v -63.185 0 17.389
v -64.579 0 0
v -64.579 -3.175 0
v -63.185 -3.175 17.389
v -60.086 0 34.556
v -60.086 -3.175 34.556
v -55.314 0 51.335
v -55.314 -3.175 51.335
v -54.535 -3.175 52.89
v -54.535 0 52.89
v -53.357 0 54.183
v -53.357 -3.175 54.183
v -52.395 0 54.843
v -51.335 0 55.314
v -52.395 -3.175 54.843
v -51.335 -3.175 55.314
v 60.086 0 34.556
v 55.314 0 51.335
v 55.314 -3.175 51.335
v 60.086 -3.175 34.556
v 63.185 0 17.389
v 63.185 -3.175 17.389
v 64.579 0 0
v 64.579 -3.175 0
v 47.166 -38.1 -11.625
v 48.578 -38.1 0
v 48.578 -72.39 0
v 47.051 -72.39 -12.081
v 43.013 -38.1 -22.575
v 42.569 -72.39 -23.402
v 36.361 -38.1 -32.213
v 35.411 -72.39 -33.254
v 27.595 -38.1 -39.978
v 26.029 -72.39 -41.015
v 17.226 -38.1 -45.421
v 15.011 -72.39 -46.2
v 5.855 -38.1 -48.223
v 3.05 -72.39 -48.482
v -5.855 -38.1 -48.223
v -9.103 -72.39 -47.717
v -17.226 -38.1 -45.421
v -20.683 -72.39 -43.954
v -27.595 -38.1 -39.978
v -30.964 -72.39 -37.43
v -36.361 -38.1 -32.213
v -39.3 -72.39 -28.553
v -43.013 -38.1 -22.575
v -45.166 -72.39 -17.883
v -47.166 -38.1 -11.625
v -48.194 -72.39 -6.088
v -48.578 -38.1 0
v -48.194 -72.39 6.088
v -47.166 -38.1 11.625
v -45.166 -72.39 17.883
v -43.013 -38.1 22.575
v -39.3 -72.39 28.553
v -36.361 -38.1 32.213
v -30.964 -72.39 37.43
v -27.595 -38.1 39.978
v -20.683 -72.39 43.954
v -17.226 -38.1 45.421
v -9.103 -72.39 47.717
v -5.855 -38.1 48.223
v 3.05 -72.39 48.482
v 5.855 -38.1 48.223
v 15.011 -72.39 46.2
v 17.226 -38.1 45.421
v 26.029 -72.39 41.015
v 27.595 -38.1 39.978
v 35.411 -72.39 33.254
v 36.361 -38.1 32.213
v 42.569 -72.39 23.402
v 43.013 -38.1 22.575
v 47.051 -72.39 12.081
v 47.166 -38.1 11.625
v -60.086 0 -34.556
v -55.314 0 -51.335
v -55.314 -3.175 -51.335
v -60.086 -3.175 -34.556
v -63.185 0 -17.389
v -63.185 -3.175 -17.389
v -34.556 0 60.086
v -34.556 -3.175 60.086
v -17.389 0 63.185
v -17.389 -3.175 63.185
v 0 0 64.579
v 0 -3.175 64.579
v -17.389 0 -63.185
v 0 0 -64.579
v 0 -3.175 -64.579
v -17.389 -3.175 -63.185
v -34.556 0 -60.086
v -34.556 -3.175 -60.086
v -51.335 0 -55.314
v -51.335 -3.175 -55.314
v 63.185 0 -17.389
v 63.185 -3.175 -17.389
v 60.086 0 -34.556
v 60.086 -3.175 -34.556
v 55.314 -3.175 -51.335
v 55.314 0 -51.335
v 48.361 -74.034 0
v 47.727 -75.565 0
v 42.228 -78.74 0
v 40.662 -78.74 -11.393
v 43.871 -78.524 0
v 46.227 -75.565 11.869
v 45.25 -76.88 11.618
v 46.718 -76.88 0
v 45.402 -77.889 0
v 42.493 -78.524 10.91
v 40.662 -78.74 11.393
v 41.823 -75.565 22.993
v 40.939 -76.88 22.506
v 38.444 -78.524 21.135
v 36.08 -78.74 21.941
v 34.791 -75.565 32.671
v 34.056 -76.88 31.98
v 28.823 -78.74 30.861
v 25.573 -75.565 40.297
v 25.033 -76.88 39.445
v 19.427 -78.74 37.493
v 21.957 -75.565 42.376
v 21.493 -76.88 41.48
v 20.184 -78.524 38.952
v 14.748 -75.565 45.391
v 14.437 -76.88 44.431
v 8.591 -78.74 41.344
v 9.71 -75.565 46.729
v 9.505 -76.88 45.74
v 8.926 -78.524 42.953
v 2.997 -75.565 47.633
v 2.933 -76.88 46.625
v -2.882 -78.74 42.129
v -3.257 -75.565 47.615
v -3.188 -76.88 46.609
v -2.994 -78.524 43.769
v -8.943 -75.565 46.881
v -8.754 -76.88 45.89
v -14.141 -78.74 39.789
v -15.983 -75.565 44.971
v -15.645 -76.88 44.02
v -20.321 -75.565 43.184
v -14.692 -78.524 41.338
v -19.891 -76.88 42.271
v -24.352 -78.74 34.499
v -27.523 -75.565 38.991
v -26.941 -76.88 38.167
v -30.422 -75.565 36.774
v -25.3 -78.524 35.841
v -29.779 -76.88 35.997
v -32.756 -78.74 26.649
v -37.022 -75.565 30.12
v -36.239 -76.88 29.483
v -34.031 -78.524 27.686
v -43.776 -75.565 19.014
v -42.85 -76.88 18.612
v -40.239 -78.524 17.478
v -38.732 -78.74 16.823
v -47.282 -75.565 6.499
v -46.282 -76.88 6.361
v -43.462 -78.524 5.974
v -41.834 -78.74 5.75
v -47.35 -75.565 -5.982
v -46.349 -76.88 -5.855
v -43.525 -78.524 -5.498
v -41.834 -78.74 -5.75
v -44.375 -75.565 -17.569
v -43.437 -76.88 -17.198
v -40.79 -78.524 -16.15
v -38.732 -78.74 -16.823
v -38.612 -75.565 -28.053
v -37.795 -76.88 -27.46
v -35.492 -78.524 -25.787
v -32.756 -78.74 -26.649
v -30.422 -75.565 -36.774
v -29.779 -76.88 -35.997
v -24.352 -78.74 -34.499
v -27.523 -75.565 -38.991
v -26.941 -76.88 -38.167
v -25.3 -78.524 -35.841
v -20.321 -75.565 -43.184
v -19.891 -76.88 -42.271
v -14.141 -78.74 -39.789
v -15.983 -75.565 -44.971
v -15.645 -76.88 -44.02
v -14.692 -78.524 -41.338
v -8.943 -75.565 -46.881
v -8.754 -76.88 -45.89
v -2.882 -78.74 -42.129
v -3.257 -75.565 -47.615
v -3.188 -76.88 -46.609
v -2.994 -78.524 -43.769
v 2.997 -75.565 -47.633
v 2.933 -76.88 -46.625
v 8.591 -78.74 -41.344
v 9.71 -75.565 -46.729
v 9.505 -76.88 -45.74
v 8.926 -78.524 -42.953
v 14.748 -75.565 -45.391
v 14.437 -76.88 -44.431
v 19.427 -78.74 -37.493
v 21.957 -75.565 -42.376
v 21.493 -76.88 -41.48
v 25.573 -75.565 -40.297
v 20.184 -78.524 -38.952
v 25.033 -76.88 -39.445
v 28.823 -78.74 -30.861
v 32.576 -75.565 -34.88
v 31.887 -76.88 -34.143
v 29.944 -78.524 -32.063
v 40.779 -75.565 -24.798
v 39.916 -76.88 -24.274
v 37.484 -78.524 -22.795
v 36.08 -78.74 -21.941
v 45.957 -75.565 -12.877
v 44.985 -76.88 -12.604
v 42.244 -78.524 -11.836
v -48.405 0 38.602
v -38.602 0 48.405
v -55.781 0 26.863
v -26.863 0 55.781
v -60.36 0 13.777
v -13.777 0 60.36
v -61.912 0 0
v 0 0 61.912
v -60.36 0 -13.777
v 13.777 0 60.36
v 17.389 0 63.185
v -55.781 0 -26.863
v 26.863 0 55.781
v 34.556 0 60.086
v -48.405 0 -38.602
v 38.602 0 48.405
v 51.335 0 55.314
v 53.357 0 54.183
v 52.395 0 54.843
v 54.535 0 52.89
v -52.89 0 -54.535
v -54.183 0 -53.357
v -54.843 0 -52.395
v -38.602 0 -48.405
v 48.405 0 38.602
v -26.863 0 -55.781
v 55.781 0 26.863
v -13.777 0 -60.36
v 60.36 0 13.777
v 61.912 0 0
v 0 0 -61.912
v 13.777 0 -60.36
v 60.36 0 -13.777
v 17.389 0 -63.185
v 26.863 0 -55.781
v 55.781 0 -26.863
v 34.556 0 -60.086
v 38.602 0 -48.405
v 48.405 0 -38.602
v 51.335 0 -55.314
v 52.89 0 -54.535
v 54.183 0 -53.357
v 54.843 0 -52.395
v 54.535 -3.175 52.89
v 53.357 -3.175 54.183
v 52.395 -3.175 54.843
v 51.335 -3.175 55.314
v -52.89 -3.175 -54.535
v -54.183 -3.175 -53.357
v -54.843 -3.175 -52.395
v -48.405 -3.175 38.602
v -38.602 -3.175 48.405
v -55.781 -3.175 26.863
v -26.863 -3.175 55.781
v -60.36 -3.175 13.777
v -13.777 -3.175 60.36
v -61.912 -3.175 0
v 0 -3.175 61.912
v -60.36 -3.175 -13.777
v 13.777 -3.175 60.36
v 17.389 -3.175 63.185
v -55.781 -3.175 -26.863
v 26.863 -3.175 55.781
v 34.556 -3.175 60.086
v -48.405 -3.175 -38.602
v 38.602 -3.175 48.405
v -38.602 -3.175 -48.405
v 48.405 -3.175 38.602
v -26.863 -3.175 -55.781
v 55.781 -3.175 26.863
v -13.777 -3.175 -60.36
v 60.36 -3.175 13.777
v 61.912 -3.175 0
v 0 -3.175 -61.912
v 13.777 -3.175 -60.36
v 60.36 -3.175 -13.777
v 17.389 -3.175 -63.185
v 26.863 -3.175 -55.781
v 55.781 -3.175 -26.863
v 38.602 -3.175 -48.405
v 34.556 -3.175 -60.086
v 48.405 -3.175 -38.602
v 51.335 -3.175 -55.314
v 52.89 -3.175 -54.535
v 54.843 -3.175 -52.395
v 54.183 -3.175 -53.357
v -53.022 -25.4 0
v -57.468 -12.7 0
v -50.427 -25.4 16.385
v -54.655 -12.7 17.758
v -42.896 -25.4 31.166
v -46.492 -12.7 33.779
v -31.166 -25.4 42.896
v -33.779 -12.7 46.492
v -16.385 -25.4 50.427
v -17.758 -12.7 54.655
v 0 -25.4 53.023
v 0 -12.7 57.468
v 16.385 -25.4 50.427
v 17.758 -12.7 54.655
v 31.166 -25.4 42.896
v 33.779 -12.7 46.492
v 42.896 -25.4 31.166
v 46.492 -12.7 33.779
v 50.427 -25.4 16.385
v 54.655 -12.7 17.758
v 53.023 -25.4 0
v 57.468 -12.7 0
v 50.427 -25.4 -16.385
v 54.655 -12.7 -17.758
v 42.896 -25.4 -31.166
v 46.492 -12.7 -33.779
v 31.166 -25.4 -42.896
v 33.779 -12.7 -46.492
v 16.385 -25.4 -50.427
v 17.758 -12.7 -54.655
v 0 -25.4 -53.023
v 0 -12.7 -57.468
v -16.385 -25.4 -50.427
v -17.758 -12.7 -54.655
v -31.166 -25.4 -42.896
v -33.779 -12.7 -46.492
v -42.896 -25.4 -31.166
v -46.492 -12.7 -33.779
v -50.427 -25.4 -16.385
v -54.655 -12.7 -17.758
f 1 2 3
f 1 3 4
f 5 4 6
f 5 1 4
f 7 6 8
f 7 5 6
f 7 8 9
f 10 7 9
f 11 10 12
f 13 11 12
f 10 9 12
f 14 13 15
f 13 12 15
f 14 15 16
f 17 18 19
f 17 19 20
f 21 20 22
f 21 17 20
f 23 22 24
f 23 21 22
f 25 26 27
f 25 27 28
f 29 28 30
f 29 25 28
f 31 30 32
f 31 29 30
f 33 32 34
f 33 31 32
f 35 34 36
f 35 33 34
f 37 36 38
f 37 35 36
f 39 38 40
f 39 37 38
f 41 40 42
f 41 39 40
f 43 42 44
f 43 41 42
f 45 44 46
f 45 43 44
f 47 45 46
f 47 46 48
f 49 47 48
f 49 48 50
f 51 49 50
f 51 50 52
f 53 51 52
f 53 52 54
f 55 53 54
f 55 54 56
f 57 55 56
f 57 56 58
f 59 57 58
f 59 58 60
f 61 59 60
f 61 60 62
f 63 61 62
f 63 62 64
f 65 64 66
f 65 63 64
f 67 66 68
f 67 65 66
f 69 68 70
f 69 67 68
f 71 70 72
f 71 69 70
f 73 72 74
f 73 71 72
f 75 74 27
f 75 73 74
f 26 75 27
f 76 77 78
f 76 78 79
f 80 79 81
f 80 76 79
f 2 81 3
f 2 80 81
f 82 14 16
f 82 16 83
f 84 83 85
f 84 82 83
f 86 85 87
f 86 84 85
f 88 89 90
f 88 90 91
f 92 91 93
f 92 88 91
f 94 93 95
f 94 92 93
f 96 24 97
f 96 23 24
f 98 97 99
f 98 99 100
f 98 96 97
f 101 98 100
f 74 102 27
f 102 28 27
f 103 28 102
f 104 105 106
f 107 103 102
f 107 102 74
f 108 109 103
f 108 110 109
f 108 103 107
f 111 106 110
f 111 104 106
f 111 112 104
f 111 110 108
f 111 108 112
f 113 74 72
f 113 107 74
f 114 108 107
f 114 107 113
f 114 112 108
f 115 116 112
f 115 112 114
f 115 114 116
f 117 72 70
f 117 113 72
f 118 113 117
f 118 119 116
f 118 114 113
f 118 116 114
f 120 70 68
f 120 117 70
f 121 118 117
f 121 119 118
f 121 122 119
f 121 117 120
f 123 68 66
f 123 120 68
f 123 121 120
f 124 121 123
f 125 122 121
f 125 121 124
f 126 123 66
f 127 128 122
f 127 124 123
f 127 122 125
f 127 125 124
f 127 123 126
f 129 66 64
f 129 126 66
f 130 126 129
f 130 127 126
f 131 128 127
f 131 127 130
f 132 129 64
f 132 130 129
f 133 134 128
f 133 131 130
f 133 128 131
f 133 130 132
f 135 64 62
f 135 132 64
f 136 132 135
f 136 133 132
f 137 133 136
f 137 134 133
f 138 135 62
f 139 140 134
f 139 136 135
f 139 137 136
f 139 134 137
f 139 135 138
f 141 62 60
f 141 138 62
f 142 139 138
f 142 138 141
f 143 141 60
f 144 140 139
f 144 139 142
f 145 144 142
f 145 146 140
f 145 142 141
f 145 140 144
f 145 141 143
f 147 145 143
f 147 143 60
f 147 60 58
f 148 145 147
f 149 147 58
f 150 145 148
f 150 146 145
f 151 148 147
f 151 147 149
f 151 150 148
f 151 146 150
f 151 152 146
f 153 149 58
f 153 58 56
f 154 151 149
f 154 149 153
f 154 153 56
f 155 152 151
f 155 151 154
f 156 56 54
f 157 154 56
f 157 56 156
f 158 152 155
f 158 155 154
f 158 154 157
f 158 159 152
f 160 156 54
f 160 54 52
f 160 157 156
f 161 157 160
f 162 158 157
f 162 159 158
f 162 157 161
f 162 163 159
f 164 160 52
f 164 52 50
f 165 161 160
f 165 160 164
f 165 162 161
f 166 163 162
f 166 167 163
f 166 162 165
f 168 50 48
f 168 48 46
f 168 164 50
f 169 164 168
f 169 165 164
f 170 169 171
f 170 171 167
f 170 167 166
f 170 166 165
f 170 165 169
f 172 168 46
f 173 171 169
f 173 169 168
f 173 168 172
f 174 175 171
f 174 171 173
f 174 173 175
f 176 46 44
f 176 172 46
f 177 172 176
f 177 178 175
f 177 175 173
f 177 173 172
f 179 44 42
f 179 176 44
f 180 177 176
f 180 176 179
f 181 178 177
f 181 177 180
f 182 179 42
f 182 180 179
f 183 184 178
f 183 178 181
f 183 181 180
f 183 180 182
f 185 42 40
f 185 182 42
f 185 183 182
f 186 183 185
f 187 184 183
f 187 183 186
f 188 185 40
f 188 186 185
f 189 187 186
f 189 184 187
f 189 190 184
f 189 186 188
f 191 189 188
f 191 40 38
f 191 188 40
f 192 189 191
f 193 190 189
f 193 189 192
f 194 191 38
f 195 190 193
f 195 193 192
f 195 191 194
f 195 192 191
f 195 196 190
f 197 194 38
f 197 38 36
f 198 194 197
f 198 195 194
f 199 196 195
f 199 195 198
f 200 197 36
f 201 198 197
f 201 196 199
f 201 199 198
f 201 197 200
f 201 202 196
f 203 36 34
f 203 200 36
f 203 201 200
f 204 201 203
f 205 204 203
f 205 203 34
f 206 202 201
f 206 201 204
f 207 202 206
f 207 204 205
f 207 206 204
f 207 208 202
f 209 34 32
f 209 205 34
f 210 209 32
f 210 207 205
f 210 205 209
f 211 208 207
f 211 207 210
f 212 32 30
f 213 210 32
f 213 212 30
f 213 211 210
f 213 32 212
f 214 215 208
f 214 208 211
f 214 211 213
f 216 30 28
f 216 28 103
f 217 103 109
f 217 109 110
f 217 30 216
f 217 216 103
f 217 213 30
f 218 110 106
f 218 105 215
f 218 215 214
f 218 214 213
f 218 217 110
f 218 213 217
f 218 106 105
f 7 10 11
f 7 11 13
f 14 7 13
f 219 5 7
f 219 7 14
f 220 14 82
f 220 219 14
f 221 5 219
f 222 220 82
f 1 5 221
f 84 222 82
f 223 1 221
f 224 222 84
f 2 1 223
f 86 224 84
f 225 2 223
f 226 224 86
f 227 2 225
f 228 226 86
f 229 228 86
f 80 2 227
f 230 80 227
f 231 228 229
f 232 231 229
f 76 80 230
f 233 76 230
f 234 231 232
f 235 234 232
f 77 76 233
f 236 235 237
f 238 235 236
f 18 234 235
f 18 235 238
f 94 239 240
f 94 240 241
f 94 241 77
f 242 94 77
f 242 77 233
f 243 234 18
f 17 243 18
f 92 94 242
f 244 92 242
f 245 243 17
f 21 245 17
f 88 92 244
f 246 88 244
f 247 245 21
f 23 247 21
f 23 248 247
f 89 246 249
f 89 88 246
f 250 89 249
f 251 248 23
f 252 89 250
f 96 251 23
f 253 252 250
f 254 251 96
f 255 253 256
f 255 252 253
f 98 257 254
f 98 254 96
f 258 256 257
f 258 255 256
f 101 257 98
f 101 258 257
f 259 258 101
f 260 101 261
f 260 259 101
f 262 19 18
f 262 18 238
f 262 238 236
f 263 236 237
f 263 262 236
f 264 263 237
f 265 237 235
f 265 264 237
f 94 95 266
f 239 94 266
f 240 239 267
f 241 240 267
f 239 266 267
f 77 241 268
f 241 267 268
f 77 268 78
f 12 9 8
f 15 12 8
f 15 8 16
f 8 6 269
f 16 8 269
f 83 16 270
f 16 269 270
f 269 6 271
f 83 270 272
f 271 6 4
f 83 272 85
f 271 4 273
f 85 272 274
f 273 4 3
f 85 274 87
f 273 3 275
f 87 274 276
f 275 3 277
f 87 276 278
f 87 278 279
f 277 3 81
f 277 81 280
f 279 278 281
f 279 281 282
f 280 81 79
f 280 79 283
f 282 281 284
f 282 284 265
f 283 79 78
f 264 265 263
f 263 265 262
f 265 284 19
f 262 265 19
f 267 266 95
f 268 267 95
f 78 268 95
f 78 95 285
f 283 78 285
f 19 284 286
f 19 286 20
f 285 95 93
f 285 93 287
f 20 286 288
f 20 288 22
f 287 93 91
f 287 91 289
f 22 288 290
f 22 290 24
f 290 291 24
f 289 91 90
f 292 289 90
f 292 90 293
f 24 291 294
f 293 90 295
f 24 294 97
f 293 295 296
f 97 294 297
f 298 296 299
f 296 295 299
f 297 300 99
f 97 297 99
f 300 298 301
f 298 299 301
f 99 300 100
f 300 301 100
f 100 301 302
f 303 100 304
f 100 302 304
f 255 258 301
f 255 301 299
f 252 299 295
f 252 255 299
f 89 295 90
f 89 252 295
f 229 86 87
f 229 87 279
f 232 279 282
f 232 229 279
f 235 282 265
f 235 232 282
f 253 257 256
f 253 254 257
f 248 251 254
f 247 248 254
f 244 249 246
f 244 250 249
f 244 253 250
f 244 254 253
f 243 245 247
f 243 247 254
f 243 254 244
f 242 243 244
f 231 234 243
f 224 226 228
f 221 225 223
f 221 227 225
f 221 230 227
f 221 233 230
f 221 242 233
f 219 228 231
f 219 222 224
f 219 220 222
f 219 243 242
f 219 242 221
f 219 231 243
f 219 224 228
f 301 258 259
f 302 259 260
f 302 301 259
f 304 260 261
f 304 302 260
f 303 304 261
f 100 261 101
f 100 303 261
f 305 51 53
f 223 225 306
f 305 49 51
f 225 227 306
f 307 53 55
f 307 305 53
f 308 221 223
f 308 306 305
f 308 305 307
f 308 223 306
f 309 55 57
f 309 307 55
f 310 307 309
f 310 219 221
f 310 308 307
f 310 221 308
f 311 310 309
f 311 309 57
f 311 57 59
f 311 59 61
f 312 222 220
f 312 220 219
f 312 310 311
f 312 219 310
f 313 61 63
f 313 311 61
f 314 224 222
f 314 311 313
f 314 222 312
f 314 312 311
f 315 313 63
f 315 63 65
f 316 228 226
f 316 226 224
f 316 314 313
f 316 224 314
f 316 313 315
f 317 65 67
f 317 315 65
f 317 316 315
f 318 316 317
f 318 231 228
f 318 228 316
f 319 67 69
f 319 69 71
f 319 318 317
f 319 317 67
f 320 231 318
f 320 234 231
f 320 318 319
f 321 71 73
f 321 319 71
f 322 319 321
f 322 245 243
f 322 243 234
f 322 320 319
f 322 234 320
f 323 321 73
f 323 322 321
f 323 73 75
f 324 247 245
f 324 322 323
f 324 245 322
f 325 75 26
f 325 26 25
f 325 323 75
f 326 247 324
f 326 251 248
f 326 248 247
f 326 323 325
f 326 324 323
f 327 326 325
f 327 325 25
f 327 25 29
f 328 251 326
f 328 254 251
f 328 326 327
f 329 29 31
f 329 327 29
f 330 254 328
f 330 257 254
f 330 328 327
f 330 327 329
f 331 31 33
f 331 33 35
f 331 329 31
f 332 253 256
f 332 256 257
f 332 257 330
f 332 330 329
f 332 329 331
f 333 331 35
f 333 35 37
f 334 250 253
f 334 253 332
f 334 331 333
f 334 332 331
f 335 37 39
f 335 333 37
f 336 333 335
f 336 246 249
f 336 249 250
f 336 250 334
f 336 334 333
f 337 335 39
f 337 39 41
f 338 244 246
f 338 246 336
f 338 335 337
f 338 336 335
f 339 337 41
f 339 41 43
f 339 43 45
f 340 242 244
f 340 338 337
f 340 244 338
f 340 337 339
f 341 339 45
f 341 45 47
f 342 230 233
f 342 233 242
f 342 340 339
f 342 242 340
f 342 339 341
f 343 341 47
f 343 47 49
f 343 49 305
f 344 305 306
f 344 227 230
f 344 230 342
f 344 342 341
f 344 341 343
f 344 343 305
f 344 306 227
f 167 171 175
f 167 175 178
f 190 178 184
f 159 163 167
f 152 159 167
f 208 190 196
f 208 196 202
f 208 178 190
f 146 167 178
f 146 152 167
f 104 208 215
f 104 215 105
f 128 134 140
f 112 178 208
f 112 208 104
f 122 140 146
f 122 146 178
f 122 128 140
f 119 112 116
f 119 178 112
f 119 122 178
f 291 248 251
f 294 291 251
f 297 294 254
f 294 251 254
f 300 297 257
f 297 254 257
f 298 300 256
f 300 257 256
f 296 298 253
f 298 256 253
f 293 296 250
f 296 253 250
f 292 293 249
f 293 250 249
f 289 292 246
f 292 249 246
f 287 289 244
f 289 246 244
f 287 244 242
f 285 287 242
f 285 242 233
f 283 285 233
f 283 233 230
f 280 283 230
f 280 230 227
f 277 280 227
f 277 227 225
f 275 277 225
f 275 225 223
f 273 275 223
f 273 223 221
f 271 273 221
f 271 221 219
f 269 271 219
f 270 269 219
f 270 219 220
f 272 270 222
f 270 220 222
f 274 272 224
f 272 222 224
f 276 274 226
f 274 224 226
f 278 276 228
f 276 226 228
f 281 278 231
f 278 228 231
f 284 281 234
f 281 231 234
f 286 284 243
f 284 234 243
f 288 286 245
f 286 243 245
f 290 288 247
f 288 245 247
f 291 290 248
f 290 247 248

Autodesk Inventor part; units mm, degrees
ref_plane "YZ Plane" through (0, 0, 0) normal (1, 0, 0) x (0, 1, 0)
ref_plane "XY Plane" through (0, 0, 0) normal (0, 0, 1) x (1, 0, 0)
sketch "Sketch1" plane through (0, 0, 0) normal (0, 1, 0) x (-1, 0, 0)
  circle A0 centre (0, 0) radius 61.9125
  dimension "d0" = 123.825
ref_plane "Work Plane1" through (0, -38.1, 0) normal (0, 1, 0) x (-1, 0, 0)
sketch "Sketch2" plane through (0, -38.1, 0) normal (0, 1, 0) x (-1, 0, 0)
  circle A0 centre (0, 0) radius 48.5775
  dimension "d2" = 97.155
loft "Loft1" add profiles "Sketch1", "Sketch2"
sketch "Sketch3" plane through (0, -38.1, 0) normal (0, -1, 0) x (1, 0, 0)
  circle A0 centre (0, 0) radius 48.5775 projected
extrude "Extrusion1" add sketch "Sketch3" along normal blind 40.64
fillet "Fillet1" radius 6.35 1 edges at (-48.5775, -78.74, 0)
sketch "Sketch4" plane through (0, 0, 0) normal (0, 1, 0) x (1, 0, 0)
  circle A0 centre (0, 0) radius 61.9125 projected
  arc A1 (-54.2856, 54.2856) -> (-64.5795, 0) centre (112.4399, -5.4483) ccw
  line L0 (0, 61.9125) -> (0, -61.9125)
  arc A2 (0, 64.5795) -> (-54.2856, 54.2856) centre (5.4483, -112.4399) ccw
  arc A3 (0, -64.5795) -> (54.2856, -54.2856) centre (-5.4483, 112.4399) ccw
  arc A4 (54.2856, -54.2856) -> (64.5795, 0) centre (-112.4399, 5.4483) ccw
  arc A5 (64.5795, 0) -> (54.2856, 54.2856) centre (-112.4399, -5.4483) ccw
  arc A6 (54.2856, 54.2856) -> (0, 64.5795) centre (-5.4483, -112.4399) ccw
  arc A7 (-64.5795, 0) -> (-54.2856, -54.2856) centre (112.4399, 5.4483) ccw
  arc A8 (-54.2856, -54.2856) -> (0, -64.5795) centre (5.4483, 112.4399) ccw
  circle A9 centre (0, 0) radius 61.9125
extrude "Extrusion2" add sketch "Sketch4" against normal blind 3.175
fillet "Fillet2" radius 6.35 4 edges at (-54.2856, -1.5875, 54.2856) (54.2856, -1.5875, 54.2856) (54.2856, -1.5875, -54.2856) (-54.2856, -1.5875, -54.2856)
properties part number "sub"
